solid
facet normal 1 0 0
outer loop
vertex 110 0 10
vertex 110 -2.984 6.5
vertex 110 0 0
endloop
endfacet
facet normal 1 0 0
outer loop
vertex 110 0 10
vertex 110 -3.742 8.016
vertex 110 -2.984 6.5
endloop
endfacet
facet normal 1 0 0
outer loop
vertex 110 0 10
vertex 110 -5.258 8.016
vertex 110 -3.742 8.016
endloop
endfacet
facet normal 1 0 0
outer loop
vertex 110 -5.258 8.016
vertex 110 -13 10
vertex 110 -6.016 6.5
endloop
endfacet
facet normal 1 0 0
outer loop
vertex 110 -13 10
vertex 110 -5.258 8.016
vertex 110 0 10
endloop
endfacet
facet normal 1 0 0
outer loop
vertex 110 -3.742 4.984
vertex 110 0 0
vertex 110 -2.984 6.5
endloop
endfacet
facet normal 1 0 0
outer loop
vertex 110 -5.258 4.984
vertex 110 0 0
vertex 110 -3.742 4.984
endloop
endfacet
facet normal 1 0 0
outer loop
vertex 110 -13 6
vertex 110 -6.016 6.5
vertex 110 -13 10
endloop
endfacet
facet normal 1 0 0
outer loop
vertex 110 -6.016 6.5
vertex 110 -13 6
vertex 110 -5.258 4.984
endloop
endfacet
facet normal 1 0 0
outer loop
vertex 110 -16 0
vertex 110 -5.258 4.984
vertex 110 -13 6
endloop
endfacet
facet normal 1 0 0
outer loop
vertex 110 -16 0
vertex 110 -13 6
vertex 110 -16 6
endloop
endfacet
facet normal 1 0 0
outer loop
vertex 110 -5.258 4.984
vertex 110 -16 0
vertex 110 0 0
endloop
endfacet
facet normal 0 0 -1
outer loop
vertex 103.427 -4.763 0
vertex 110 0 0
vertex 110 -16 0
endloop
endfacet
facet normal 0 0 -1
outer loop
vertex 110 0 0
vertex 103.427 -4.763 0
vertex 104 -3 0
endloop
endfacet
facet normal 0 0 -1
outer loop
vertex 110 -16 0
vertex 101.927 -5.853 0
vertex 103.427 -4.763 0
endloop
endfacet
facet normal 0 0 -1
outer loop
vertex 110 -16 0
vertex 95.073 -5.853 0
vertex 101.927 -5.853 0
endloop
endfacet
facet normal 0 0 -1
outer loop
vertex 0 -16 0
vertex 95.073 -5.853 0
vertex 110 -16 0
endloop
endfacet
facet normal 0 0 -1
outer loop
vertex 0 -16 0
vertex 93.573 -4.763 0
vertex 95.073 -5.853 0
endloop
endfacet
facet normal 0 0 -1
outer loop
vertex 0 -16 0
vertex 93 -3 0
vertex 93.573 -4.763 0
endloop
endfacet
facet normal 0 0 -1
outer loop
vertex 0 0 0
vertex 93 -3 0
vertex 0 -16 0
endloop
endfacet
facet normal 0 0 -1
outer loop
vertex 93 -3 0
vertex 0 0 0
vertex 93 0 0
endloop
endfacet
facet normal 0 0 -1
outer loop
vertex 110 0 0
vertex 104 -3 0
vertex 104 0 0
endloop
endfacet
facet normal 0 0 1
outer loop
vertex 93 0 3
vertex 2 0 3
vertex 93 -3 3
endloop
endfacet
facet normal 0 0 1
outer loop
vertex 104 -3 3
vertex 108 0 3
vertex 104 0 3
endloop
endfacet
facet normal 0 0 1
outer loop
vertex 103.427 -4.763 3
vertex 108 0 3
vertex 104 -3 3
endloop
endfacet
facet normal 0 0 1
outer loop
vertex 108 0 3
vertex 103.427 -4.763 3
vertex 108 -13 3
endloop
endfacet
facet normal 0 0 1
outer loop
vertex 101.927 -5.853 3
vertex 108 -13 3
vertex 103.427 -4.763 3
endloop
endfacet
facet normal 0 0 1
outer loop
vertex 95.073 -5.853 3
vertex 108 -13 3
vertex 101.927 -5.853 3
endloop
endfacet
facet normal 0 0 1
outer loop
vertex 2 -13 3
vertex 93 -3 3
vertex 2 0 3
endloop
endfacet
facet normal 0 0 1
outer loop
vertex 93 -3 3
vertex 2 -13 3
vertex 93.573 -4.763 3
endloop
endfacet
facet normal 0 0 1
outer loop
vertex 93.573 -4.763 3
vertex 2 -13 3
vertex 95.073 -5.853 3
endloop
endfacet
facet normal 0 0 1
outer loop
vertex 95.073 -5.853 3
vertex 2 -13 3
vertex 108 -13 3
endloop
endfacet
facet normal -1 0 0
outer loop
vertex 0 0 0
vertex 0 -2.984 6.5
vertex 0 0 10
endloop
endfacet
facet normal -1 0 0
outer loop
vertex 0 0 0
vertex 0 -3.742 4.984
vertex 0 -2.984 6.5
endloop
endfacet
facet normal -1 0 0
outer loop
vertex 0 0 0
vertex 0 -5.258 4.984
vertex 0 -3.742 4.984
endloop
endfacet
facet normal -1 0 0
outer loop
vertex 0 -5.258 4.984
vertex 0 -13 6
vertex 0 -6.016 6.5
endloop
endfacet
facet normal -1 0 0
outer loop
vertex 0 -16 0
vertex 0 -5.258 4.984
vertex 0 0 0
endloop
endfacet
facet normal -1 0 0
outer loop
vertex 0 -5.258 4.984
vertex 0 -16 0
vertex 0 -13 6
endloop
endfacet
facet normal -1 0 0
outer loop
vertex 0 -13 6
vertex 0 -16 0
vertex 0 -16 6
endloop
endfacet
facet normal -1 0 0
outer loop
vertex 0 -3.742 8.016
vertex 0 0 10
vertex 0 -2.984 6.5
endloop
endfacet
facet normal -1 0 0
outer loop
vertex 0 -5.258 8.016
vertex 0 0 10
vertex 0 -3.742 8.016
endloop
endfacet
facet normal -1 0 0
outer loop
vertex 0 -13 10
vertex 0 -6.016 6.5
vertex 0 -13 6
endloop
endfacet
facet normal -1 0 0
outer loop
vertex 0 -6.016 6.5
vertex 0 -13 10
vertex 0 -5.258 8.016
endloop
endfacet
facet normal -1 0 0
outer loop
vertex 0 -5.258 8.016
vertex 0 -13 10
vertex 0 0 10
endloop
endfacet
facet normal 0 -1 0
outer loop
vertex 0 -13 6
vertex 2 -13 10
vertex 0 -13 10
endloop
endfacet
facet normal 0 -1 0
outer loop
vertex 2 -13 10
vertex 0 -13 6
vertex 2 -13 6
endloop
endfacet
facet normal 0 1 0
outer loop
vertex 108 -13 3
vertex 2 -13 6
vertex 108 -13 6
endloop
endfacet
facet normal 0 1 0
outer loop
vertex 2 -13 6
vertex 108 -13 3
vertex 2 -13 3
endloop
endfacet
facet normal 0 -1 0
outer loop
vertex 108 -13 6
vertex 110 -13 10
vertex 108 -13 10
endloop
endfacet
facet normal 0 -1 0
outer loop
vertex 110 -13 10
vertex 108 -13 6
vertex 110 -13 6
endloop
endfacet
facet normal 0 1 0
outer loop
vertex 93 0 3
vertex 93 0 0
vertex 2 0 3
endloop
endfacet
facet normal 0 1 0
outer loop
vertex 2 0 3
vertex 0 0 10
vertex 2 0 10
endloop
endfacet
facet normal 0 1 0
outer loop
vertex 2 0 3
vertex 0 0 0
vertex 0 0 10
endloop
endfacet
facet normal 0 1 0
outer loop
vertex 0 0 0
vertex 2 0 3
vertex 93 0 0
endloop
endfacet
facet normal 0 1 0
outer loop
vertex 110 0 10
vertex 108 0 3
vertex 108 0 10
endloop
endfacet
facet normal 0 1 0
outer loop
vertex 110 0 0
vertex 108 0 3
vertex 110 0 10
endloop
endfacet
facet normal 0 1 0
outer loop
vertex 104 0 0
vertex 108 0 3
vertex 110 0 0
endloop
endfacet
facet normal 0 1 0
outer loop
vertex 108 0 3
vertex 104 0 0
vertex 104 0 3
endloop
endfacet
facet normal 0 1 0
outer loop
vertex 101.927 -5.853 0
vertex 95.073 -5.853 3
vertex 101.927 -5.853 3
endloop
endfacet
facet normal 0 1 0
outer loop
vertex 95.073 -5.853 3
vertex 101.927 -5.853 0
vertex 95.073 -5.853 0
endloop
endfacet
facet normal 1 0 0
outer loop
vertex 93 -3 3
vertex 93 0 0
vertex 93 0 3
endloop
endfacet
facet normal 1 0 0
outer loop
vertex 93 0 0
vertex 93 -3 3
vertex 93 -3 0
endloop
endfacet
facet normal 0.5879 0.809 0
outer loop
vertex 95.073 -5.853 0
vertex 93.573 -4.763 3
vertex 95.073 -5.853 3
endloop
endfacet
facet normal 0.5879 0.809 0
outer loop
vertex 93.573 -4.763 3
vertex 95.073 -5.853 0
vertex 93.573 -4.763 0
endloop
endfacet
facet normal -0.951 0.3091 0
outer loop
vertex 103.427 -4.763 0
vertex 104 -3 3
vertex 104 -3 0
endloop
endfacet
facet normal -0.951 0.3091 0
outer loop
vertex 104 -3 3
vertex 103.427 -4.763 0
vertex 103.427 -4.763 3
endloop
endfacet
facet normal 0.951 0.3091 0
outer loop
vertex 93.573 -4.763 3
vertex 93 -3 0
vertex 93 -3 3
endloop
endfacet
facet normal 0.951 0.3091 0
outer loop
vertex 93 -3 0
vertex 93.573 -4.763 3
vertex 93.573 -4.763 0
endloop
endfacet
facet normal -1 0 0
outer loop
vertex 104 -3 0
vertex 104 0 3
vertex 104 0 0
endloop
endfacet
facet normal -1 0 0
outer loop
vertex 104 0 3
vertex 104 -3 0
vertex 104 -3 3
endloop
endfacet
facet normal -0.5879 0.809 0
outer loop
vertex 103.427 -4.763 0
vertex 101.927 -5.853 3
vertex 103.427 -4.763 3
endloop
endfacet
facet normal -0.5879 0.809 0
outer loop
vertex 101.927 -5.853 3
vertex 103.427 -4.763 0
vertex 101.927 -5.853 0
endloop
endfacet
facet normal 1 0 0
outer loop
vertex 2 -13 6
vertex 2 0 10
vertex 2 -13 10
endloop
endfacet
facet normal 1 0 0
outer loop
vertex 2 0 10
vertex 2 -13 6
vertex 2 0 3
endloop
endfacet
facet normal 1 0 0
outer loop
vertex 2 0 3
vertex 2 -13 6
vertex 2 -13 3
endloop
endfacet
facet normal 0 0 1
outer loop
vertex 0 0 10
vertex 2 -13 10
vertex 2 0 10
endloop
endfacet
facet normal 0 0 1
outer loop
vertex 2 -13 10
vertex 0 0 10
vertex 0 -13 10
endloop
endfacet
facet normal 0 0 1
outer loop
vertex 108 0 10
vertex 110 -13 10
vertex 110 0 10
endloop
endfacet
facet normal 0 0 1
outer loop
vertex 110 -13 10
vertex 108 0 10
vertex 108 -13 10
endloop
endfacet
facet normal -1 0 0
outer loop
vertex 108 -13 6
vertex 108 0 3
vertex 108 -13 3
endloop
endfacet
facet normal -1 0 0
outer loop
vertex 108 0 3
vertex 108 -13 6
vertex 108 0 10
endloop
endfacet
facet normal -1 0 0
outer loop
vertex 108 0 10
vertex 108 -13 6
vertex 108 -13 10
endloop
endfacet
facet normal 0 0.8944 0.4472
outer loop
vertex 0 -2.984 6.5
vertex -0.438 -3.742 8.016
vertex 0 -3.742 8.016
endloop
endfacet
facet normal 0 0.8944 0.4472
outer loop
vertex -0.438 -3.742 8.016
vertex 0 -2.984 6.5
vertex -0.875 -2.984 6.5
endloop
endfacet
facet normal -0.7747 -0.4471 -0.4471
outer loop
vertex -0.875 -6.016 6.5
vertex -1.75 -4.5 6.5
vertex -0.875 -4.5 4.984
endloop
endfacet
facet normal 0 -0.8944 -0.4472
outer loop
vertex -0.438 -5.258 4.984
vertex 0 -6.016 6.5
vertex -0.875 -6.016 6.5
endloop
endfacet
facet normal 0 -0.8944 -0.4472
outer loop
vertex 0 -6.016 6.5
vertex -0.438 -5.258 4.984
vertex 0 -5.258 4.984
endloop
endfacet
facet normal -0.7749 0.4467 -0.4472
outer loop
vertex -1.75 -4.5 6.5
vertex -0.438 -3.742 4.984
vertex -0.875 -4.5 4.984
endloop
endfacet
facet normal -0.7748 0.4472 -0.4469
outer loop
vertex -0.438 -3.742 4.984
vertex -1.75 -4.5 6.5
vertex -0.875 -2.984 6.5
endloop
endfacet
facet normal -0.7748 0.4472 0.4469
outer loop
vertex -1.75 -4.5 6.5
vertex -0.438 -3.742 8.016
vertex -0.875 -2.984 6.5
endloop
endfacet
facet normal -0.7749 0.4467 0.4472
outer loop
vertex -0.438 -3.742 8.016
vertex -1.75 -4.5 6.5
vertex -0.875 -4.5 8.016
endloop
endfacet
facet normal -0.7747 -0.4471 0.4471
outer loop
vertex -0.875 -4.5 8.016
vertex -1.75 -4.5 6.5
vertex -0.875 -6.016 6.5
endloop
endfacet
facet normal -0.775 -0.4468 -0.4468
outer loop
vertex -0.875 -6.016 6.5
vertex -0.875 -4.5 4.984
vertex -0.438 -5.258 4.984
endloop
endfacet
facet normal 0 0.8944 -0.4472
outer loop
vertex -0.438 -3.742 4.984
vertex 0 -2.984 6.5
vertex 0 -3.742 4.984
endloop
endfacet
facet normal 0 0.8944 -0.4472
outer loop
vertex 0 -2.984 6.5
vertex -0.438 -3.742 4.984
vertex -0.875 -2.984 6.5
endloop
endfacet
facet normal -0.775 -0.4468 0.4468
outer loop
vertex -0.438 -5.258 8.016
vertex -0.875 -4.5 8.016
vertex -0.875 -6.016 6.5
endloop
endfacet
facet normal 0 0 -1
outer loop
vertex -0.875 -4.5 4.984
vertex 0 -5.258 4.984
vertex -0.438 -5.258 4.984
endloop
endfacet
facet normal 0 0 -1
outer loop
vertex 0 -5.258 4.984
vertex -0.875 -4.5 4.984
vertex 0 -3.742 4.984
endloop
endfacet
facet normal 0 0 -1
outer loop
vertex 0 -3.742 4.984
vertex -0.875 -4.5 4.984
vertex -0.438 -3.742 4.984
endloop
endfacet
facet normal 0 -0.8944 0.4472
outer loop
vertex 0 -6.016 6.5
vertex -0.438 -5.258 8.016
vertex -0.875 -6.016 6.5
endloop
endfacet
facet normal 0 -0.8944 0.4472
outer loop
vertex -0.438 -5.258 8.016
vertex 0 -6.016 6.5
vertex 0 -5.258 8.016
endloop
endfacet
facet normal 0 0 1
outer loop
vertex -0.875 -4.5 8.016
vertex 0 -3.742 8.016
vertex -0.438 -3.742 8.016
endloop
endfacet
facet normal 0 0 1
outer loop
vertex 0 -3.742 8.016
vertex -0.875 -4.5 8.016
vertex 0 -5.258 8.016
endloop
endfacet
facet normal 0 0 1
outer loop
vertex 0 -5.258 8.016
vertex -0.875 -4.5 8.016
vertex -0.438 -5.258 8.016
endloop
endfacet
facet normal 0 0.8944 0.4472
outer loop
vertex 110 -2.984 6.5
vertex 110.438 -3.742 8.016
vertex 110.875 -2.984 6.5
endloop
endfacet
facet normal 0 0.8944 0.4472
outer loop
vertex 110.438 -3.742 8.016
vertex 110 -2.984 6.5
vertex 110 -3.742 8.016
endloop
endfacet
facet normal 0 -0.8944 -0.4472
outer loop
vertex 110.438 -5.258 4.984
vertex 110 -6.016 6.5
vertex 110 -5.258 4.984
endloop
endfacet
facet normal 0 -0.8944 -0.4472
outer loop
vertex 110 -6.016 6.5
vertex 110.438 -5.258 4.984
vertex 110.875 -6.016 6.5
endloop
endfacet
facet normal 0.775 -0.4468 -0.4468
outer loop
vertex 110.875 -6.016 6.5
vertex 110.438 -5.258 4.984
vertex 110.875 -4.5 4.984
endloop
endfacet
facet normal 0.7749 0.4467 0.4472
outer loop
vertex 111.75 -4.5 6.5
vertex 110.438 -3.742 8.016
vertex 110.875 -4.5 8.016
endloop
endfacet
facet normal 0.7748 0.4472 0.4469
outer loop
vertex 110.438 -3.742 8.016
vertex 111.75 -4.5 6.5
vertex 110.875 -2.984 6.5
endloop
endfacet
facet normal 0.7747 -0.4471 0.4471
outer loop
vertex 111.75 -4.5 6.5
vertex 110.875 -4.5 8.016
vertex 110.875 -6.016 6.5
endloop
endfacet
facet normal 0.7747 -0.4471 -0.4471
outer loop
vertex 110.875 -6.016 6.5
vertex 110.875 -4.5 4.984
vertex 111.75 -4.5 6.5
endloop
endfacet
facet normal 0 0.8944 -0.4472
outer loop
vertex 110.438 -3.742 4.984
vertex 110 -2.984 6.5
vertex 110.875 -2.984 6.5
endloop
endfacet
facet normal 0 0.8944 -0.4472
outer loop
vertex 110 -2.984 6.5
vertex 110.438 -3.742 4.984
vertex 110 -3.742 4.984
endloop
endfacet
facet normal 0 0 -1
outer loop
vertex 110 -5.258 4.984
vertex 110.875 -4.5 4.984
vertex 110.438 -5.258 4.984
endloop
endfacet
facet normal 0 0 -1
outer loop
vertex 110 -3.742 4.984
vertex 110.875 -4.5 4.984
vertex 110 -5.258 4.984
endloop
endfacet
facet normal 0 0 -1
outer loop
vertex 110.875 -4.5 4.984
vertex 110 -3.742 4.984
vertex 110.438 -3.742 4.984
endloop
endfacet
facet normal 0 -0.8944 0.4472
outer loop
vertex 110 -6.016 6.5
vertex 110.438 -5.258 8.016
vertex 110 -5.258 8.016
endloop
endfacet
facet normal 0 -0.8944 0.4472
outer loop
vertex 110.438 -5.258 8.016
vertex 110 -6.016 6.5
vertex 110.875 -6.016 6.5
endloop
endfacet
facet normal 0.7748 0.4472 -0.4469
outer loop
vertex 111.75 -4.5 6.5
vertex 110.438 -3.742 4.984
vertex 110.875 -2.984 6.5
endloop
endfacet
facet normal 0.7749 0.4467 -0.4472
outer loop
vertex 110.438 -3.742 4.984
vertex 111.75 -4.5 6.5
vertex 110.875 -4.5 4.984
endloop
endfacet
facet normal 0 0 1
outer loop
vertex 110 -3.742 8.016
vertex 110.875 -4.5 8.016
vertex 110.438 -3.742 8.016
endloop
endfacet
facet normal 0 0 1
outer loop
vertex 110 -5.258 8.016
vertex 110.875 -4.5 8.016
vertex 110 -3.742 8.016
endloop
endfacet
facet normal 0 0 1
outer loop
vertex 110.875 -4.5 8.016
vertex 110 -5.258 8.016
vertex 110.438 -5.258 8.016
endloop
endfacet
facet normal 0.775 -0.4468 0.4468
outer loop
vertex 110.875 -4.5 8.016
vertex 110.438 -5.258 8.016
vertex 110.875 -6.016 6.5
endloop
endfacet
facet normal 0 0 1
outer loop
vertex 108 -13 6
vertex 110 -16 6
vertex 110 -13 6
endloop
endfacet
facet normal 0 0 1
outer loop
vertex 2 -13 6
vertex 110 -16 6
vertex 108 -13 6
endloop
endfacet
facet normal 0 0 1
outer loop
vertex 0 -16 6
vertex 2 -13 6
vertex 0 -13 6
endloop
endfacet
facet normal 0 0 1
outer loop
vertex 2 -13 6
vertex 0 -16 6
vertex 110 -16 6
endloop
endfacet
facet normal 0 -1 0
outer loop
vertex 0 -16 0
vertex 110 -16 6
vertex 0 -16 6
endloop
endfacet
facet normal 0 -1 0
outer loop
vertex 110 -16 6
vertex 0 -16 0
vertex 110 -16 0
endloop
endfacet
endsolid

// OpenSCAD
// Power supply cover for S-350 model.

psu_cover();

module psu_cover() {

	translate([0,0,3]) rotate([180,0,0]) union() {
		difference() {
			cube([110, 13, 3]);
			hull() {
				translate([110-14,3,0]) cylinder(r=6/2,h=6);
				translate([110-14,0,0]) cylinder(r=6/2,h=6);
				translate([110-9,3,0]) cylinder(r=6/2,h=6);
				translate([110-9,0,0]) cylinder(r=6/2,h=6);
			}
		}
		translate([0,0,-10+3]) cube([2,13,10]);
		translate([110-2,0,-10+3]) cube([2,13,10]);
		
		translate([0,12-7.5,(3/2)-5]) sphere(r=3.5/2);
		translate([110,12-7.5,(3/2)-5]) sphere(r=3.5/2);
	
		translate([0,13,-6+3]) cube([110,3,6]);
	}
}
